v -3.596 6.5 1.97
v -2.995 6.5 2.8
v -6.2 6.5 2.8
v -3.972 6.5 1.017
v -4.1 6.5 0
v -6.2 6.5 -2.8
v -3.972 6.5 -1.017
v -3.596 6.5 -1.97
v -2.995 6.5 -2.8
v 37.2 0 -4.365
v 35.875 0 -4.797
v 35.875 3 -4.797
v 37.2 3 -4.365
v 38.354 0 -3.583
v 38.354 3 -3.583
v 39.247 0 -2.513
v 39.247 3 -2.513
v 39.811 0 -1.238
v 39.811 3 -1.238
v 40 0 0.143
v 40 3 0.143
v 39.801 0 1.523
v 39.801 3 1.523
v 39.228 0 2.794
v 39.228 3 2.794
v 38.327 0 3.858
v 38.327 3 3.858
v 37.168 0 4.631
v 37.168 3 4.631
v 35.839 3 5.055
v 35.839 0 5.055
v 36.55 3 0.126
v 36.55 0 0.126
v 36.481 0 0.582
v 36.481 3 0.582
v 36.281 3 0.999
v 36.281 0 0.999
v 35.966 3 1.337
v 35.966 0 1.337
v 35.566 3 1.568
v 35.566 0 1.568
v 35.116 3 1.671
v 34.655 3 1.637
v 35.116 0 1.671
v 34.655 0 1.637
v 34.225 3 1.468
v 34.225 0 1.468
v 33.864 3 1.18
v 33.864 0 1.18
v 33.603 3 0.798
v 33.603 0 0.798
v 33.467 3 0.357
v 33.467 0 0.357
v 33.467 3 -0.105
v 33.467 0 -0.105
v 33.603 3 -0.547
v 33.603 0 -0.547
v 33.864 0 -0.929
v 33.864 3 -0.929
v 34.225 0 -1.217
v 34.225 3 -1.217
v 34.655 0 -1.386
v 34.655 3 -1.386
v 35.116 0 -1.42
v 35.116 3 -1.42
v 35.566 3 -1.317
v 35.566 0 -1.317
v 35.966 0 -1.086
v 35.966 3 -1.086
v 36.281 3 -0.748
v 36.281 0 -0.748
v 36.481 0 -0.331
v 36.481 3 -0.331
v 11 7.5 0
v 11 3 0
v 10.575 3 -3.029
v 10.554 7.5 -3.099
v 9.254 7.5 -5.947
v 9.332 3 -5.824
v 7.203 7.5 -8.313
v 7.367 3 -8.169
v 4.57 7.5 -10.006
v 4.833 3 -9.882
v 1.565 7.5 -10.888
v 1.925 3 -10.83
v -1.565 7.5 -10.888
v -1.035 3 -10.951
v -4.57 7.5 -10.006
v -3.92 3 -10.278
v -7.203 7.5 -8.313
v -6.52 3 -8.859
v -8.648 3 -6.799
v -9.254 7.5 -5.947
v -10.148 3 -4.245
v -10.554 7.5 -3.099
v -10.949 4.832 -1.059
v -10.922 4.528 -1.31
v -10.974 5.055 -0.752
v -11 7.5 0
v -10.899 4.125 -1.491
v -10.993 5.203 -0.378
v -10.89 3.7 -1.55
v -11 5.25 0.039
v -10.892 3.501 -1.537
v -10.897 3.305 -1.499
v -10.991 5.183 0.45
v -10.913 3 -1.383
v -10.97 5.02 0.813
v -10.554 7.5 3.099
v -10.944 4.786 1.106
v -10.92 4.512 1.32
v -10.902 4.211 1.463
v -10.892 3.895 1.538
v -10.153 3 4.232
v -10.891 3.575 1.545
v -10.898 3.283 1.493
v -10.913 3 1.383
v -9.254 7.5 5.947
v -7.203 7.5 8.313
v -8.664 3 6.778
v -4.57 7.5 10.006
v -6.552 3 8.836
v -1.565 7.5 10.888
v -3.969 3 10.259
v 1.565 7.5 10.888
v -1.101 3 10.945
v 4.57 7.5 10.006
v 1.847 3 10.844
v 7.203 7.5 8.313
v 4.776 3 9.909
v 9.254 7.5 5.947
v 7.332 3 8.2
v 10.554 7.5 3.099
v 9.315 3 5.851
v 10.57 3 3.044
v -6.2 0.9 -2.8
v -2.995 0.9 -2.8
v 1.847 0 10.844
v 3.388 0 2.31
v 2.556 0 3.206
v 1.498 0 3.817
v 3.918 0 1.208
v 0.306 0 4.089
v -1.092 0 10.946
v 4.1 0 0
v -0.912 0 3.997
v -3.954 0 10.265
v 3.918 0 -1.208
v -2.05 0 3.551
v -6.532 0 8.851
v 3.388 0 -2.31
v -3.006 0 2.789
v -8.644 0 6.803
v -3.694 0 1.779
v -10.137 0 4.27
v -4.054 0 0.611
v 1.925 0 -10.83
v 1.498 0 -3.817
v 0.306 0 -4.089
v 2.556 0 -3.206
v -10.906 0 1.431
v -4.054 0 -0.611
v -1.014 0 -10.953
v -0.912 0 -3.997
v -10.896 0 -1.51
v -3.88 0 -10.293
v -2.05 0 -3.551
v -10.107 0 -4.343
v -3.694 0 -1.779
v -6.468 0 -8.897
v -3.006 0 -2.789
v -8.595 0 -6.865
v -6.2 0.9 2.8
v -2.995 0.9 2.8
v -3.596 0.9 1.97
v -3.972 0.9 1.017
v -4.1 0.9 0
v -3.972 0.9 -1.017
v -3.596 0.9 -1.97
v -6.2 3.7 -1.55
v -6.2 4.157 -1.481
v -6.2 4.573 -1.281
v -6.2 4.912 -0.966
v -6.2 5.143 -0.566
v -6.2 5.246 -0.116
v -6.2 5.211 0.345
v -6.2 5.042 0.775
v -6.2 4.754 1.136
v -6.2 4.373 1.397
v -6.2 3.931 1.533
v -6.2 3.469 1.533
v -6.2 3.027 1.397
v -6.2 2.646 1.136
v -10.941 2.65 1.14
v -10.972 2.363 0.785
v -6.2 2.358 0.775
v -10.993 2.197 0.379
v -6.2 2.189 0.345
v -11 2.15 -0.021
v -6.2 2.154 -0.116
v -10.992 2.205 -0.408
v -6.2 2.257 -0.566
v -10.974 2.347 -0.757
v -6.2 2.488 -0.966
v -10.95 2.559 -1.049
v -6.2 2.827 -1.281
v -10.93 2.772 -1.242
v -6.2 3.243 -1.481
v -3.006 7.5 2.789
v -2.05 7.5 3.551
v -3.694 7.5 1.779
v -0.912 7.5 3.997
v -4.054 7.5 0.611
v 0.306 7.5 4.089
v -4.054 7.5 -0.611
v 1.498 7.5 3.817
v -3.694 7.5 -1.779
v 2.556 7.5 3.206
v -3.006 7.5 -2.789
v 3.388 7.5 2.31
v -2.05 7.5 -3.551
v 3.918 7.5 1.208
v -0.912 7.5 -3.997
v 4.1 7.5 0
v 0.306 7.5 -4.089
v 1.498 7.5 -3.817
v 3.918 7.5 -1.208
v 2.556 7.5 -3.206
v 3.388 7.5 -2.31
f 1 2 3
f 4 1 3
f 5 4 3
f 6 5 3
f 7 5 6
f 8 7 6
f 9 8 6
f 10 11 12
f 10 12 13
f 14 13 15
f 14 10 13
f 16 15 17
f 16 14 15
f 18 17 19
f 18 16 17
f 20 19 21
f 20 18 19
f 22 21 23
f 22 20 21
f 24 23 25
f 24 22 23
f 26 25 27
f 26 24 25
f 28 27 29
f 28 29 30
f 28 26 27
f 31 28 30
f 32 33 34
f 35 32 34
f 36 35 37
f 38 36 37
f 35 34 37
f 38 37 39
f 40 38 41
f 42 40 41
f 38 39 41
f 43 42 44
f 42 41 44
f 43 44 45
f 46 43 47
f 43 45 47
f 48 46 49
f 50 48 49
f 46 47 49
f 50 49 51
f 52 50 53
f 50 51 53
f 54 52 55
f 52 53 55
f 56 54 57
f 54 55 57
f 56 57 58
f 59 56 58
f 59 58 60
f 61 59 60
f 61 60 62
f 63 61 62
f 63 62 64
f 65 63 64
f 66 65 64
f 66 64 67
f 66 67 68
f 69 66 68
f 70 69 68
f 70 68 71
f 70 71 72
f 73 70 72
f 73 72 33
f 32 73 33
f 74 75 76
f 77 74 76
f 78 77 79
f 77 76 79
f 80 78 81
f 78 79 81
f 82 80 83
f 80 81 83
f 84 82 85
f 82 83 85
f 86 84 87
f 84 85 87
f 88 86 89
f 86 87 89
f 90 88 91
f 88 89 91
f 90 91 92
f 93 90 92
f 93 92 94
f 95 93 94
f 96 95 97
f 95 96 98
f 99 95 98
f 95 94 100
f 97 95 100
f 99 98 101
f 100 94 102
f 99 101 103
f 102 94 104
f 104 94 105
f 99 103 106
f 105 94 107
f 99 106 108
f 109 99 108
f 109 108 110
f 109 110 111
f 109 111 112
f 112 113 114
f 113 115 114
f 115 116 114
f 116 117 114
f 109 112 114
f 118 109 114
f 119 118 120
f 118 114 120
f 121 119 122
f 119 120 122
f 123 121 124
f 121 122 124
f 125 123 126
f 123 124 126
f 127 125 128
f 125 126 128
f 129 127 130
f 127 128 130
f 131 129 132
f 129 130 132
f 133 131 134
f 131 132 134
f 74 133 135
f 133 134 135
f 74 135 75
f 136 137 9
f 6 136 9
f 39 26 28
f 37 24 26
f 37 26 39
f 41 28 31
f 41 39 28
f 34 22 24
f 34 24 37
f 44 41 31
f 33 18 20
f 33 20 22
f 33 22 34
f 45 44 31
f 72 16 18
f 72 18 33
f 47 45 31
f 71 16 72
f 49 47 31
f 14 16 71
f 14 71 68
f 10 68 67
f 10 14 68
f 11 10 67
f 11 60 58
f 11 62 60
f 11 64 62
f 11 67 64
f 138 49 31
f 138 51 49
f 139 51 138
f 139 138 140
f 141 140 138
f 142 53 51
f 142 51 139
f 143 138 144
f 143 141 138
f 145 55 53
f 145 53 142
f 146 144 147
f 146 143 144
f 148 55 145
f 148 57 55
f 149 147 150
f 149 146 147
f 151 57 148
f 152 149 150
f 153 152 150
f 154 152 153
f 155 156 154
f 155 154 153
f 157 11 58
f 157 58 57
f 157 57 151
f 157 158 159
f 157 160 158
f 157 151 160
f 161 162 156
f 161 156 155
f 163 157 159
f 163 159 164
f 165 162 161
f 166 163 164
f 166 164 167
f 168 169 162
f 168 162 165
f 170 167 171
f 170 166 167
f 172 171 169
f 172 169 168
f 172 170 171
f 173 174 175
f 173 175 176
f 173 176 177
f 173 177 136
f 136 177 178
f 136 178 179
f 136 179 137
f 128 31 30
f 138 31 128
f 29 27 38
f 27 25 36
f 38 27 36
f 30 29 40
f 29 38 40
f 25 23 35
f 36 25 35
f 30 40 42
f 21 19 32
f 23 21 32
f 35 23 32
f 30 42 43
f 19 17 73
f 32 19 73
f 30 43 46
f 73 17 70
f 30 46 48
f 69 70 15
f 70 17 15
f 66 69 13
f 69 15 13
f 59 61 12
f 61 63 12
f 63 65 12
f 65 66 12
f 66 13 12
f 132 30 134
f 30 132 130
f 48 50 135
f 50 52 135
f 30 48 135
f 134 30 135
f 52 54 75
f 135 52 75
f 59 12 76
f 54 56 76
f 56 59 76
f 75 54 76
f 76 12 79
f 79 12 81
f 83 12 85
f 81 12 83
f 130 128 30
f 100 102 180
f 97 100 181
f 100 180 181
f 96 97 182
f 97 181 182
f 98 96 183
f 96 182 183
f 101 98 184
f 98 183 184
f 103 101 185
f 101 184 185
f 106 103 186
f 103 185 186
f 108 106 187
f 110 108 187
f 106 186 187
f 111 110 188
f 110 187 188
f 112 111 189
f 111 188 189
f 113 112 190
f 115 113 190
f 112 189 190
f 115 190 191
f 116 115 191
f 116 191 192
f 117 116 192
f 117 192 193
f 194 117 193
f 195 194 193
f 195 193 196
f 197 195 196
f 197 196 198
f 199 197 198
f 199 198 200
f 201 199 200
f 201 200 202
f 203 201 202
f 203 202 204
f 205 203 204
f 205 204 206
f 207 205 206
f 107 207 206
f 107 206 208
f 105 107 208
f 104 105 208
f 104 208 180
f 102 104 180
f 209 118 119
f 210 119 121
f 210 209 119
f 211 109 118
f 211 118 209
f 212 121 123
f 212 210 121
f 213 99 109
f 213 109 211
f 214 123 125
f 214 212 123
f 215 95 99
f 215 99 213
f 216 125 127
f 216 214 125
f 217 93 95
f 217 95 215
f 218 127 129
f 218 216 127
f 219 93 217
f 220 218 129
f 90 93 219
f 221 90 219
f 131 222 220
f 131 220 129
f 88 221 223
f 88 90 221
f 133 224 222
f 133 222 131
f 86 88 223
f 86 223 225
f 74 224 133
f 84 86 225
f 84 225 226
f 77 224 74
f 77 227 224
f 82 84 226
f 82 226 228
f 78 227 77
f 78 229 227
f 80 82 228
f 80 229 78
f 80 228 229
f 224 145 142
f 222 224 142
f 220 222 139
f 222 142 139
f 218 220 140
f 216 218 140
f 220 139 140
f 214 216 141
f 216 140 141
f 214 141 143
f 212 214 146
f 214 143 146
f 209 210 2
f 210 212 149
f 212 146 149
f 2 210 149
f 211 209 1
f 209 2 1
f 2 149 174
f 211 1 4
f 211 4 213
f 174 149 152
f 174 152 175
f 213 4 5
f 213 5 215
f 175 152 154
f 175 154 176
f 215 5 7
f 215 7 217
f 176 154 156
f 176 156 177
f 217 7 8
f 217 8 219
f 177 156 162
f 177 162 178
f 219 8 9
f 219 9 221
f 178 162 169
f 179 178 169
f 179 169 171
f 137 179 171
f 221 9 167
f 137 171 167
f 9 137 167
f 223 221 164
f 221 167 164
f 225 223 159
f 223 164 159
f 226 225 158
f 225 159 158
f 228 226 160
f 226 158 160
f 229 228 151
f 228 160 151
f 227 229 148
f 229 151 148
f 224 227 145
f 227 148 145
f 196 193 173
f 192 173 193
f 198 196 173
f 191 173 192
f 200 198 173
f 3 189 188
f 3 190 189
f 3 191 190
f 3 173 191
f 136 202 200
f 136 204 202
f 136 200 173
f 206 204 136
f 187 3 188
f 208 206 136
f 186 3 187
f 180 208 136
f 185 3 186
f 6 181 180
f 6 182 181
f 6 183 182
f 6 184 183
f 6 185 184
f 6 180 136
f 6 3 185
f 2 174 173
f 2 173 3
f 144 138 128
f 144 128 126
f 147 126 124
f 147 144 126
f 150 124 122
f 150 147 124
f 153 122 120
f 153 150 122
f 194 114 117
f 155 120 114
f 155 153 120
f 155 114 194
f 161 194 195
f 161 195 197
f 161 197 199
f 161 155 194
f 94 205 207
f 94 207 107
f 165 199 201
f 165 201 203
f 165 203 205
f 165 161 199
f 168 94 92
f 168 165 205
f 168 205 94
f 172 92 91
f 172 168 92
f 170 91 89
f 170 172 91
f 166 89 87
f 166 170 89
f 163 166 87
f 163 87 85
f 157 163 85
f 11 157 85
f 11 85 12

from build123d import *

# Parameters (mm, degrees)
EXTRUDE_1_DEPTH       = 3
SKETCH_4_R            = 11
EXTRUDE_2_DEPTH       = 4.5
SKETCH_5_R            = 4.1
SKETCH_5_R_2          = 1.55
CUT_EXTRUDE_1_DEPTH   = 8.5
SKETCH_7_W            = 5.6
SKETCH_7_H            = 5.6
CUT_EXTRUDE_812_DEPTH = 2.1
SKETCH_8_R            = 1.55
CUT_EXTRUDE_M3_DEPTH  = 7.9


with BuildPart() as part:
    # 草图2 → 凸台-拉伸1 (new body)
    with BuildSketch(Plane(origin=(0, 0, 0), x_dir=(1, 0, 0), z_dir=(0, 1, 0))):
        with BuildLine():
            Line((1.924560376, 10.830330898), (35.874800171, 4.797340137))
            ThreePointArc((35.874800171, 4.797340137), (39.999967838, -0.143471364), (35.839463489, -5.054563924))
            Line((35.839463489, -5.054563924), (1.846819677, -10.843858035))
            ThreePointArc((1.846819677, -10.843858035), (-10.999929243, 0.039454403), (1.924560376, 10.830330898))
        make_face()
    extrude(amount=EXTRUDE_1_DEPTH)

    # 草图4 → 凸台-拉伸2 (add)
    with BuildSketch(Plane(origin=(0, 3, 0), x_dir=(1, 0, 0), z_dir=(0, 1, 0))):
        Circle(SKETCH_4_R)
    extrude(amount=EXTRUDE_2_DEPTH)

    # 草图5 → 切除-拉伸1 (cut, through all)
    with BuildSketch(Plane.XZ):
        Circle(SKETCH_5_R)
        with Locations((35, 0.125537544)):
            Circle(SKETCH_5_R_2)
    extrude(amount=-CUT_EXTRUDE_1_DEPTH, mode=Mode.SUBTRACT)

    # 草图7 → Cut-Extrude 812 (cut, symmetric)
    with BuildSketch(Plane(origin=(-4.1, 0, 0), x_dir=(0, 0, -1), z_dir=(1, 0, 0))):
        with Locations((0, 3.7)):
            Rectangle(SKETCH_7_W, SKETCH_7_H)
    extrude(amount=CUT_EXTRUDE_812_DEPTH, both=True, mode=Mode.SUBTRACT)

    # 草图8 → 切除-M3孔 (cut, through all)
    with BuildSketch(Plane(origin=(-4.1, 0, 0), x_dir=(0, 0, -1), z_dir=(1, 0, 0))):
        with Locations((0, 3.7)):
            Circle(SKETCH_8_R)
    extrude(amount=-CUT_EXTRUDE_M3_DEPTH, mode=Mode.SUBTRACT)


solid = part.part
